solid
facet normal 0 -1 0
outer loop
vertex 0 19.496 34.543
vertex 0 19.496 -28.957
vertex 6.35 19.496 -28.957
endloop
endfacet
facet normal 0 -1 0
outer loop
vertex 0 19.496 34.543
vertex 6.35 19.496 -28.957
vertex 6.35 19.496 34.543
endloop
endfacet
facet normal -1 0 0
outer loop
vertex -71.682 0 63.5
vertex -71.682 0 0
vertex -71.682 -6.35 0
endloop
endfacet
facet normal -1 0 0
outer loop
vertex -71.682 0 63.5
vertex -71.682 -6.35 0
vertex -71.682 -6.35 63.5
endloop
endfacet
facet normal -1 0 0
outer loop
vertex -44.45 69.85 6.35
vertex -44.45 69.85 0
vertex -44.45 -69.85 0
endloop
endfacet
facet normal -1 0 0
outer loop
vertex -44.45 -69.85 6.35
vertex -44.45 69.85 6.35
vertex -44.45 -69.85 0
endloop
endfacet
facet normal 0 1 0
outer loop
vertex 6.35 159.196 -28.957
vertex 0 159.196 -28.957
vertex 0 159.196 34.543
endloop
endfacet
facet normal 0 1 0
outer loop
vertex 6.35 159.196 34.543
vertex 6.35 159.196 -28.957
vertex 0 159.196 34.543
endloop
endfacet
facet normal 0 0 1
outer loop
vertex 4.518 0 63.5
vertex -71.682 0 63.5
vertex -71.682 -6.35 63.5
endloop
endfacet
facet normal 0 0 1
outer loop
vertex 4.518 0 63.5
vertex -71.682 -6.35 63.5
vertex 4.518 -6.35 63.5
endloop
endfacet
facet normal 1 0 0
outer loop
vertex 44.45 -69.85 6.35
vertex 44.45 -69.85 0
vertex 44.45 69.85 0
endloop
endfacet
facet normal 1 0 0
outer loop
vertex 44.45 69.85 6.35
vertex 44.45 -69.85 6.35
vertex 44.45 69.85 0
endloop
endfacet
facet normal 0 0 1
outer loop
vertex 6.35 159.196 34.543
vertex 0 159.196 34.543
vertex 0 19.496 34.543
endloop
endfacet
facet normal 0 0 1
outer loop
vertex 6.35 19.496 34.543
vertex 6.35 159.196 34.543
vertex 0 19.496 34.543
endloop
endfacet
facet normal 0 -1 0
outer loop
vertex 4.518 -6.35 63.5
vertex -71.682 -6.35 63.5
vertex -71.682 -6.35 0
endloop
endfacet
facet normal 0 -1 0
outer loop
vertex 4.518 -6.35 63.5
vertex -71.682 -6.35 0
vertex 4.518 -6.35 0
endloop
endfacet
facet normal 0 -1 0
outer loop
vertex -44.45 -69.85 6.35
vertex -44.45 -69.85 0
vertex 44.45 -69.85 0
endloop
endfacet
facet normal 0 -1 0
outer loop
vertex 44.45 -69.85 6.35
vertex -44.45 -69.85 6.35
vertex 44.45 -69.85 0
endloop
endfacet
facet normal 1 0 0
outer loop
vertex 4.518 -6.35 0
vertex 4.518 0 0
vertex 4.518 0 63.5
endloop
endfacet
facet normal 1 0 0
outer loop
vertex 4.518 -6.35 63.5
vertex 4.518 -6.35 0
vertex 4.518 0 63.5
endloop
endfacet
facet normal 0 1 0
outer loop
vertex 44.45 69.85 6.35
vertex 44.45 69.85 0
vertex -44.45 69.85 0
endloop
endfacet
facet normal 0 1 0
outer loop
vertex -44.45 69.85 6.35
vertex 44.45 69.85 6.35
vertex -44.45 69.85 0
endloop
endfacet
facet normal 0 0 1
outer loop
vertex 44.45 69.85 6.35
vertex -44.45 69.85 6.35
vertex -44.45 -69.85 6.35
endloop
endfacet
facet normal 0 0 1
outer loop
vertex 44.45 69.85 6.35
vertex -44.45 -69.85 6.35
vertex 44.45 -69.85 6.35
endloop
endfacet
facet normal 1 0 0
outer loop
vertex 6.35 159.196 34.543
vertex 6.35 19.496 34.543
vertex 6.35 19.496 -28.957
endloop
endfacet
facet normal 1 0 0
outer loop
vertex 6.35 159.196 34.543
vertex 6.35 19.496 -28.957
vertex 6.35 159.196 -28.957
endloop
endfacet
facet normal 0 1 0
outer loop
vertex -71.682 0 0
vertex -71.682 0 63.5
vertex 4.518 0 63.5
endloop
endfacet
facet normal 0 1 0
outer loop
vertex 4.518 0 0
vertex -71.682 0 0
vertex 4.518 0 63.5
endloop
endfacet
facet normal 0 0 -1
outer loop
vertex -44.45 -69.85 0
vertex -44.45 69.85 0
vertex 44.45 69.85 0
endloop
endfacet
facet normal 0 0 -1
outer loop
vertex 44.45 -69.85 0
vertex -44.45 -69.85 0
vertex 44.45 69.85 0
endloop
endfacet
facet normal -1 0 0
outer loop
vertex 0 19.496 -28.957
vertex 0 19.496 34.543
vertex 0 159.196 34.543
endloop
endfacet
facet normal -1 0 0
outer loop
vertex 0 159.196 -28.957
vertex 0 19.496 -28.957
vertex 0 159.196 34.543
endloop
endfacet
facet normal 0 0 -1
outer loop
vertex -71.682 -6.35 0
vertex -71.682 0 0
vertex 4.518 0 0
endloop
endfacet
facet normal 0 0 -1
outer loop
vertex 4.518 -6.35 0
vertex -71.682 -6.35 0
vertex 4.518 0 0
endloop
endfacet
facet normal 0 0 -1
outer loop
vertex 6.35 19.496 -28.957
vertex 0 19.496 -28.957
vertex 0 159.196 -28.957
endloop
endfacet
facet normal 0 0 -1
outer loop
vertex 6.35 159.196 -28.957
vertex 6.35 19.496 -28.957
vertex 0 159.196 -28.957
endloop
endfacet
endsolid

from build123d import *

# Parameters (mm, degrees)
F2_W     = 76.2
F2_H     = 63.5
F3_DEPTH = 6.35
F1_W     = 127
F1_H     = 63.5
F1_W_2   = 6.35
F4_DEPTH = 6.35
F5_DEPTH = 6.35


with BuildPart() as f3:
    # F2 (on Front) → F3 (new body)
    with BuildSketch(Plane.XZ):
        with Locations((-33.5817006469, 31.75)):
            Rectangle(F2_W, F2_H)
    extrude(amount=F3_DEPTH)


with BuildPart() as f4:
    # F1 (on Right) → F4 (new body)
    with BuildSketch(Plane.YZ):
        with Locations((89.3461111993, 2.793211019)):
            Rectangle(F1_W, F1_H)
        with Locations((22.6711111993, 2.793211019)):
            Rectangle(F1_W_2, F1_H)
        with Locations((156.0211111993, 2.793211019)):
            Rectangle(F1_W_2, F1_H)
    extrude(amount=F4_DEPTH)


with BuildPart() as f5:
    # F0 (on Top) → F5 (new body)
    with BuildSketch(Plane.XY):
        Polygon((38.1, 0), (0, 0), (-38.1, 0), (-38.1, -63.5), (0, -63.5), (38.1, -63.5), align=None)
        Polygon((-38.1, 0), (0, 0), (38.1, 0), (38.1, 63.5), (0, 63.5), (-38.1, 63.5), align=None)
        Polygon((-44.45, 0), (-38.1, 0), (-38.1, 63.5), (0, 63.5), (0, 69.85), (-44.45, 69.85), align=None)
        Polygon((-38.1, -63.5), (-38.1, 0), (-44.45, 0), (-44.45, -69.85), (0, -69.85), (0, -63.5), align=None)
        Polygon((44.45, 0), (38.1, 0), (38.1, -63.5), (0, -63.5), (0, -69.85), (44.45, -69.85), align=None)
        Polygon((38.1, 63.5), (38.1, 0), (44.45, 0), (44.45, 69.85), (0, 69.85), (0, 63.5), align=None)
    extrude(amount=F5_DEPTH)


solid = Compound([f3.part, f4.part, f5.part])
